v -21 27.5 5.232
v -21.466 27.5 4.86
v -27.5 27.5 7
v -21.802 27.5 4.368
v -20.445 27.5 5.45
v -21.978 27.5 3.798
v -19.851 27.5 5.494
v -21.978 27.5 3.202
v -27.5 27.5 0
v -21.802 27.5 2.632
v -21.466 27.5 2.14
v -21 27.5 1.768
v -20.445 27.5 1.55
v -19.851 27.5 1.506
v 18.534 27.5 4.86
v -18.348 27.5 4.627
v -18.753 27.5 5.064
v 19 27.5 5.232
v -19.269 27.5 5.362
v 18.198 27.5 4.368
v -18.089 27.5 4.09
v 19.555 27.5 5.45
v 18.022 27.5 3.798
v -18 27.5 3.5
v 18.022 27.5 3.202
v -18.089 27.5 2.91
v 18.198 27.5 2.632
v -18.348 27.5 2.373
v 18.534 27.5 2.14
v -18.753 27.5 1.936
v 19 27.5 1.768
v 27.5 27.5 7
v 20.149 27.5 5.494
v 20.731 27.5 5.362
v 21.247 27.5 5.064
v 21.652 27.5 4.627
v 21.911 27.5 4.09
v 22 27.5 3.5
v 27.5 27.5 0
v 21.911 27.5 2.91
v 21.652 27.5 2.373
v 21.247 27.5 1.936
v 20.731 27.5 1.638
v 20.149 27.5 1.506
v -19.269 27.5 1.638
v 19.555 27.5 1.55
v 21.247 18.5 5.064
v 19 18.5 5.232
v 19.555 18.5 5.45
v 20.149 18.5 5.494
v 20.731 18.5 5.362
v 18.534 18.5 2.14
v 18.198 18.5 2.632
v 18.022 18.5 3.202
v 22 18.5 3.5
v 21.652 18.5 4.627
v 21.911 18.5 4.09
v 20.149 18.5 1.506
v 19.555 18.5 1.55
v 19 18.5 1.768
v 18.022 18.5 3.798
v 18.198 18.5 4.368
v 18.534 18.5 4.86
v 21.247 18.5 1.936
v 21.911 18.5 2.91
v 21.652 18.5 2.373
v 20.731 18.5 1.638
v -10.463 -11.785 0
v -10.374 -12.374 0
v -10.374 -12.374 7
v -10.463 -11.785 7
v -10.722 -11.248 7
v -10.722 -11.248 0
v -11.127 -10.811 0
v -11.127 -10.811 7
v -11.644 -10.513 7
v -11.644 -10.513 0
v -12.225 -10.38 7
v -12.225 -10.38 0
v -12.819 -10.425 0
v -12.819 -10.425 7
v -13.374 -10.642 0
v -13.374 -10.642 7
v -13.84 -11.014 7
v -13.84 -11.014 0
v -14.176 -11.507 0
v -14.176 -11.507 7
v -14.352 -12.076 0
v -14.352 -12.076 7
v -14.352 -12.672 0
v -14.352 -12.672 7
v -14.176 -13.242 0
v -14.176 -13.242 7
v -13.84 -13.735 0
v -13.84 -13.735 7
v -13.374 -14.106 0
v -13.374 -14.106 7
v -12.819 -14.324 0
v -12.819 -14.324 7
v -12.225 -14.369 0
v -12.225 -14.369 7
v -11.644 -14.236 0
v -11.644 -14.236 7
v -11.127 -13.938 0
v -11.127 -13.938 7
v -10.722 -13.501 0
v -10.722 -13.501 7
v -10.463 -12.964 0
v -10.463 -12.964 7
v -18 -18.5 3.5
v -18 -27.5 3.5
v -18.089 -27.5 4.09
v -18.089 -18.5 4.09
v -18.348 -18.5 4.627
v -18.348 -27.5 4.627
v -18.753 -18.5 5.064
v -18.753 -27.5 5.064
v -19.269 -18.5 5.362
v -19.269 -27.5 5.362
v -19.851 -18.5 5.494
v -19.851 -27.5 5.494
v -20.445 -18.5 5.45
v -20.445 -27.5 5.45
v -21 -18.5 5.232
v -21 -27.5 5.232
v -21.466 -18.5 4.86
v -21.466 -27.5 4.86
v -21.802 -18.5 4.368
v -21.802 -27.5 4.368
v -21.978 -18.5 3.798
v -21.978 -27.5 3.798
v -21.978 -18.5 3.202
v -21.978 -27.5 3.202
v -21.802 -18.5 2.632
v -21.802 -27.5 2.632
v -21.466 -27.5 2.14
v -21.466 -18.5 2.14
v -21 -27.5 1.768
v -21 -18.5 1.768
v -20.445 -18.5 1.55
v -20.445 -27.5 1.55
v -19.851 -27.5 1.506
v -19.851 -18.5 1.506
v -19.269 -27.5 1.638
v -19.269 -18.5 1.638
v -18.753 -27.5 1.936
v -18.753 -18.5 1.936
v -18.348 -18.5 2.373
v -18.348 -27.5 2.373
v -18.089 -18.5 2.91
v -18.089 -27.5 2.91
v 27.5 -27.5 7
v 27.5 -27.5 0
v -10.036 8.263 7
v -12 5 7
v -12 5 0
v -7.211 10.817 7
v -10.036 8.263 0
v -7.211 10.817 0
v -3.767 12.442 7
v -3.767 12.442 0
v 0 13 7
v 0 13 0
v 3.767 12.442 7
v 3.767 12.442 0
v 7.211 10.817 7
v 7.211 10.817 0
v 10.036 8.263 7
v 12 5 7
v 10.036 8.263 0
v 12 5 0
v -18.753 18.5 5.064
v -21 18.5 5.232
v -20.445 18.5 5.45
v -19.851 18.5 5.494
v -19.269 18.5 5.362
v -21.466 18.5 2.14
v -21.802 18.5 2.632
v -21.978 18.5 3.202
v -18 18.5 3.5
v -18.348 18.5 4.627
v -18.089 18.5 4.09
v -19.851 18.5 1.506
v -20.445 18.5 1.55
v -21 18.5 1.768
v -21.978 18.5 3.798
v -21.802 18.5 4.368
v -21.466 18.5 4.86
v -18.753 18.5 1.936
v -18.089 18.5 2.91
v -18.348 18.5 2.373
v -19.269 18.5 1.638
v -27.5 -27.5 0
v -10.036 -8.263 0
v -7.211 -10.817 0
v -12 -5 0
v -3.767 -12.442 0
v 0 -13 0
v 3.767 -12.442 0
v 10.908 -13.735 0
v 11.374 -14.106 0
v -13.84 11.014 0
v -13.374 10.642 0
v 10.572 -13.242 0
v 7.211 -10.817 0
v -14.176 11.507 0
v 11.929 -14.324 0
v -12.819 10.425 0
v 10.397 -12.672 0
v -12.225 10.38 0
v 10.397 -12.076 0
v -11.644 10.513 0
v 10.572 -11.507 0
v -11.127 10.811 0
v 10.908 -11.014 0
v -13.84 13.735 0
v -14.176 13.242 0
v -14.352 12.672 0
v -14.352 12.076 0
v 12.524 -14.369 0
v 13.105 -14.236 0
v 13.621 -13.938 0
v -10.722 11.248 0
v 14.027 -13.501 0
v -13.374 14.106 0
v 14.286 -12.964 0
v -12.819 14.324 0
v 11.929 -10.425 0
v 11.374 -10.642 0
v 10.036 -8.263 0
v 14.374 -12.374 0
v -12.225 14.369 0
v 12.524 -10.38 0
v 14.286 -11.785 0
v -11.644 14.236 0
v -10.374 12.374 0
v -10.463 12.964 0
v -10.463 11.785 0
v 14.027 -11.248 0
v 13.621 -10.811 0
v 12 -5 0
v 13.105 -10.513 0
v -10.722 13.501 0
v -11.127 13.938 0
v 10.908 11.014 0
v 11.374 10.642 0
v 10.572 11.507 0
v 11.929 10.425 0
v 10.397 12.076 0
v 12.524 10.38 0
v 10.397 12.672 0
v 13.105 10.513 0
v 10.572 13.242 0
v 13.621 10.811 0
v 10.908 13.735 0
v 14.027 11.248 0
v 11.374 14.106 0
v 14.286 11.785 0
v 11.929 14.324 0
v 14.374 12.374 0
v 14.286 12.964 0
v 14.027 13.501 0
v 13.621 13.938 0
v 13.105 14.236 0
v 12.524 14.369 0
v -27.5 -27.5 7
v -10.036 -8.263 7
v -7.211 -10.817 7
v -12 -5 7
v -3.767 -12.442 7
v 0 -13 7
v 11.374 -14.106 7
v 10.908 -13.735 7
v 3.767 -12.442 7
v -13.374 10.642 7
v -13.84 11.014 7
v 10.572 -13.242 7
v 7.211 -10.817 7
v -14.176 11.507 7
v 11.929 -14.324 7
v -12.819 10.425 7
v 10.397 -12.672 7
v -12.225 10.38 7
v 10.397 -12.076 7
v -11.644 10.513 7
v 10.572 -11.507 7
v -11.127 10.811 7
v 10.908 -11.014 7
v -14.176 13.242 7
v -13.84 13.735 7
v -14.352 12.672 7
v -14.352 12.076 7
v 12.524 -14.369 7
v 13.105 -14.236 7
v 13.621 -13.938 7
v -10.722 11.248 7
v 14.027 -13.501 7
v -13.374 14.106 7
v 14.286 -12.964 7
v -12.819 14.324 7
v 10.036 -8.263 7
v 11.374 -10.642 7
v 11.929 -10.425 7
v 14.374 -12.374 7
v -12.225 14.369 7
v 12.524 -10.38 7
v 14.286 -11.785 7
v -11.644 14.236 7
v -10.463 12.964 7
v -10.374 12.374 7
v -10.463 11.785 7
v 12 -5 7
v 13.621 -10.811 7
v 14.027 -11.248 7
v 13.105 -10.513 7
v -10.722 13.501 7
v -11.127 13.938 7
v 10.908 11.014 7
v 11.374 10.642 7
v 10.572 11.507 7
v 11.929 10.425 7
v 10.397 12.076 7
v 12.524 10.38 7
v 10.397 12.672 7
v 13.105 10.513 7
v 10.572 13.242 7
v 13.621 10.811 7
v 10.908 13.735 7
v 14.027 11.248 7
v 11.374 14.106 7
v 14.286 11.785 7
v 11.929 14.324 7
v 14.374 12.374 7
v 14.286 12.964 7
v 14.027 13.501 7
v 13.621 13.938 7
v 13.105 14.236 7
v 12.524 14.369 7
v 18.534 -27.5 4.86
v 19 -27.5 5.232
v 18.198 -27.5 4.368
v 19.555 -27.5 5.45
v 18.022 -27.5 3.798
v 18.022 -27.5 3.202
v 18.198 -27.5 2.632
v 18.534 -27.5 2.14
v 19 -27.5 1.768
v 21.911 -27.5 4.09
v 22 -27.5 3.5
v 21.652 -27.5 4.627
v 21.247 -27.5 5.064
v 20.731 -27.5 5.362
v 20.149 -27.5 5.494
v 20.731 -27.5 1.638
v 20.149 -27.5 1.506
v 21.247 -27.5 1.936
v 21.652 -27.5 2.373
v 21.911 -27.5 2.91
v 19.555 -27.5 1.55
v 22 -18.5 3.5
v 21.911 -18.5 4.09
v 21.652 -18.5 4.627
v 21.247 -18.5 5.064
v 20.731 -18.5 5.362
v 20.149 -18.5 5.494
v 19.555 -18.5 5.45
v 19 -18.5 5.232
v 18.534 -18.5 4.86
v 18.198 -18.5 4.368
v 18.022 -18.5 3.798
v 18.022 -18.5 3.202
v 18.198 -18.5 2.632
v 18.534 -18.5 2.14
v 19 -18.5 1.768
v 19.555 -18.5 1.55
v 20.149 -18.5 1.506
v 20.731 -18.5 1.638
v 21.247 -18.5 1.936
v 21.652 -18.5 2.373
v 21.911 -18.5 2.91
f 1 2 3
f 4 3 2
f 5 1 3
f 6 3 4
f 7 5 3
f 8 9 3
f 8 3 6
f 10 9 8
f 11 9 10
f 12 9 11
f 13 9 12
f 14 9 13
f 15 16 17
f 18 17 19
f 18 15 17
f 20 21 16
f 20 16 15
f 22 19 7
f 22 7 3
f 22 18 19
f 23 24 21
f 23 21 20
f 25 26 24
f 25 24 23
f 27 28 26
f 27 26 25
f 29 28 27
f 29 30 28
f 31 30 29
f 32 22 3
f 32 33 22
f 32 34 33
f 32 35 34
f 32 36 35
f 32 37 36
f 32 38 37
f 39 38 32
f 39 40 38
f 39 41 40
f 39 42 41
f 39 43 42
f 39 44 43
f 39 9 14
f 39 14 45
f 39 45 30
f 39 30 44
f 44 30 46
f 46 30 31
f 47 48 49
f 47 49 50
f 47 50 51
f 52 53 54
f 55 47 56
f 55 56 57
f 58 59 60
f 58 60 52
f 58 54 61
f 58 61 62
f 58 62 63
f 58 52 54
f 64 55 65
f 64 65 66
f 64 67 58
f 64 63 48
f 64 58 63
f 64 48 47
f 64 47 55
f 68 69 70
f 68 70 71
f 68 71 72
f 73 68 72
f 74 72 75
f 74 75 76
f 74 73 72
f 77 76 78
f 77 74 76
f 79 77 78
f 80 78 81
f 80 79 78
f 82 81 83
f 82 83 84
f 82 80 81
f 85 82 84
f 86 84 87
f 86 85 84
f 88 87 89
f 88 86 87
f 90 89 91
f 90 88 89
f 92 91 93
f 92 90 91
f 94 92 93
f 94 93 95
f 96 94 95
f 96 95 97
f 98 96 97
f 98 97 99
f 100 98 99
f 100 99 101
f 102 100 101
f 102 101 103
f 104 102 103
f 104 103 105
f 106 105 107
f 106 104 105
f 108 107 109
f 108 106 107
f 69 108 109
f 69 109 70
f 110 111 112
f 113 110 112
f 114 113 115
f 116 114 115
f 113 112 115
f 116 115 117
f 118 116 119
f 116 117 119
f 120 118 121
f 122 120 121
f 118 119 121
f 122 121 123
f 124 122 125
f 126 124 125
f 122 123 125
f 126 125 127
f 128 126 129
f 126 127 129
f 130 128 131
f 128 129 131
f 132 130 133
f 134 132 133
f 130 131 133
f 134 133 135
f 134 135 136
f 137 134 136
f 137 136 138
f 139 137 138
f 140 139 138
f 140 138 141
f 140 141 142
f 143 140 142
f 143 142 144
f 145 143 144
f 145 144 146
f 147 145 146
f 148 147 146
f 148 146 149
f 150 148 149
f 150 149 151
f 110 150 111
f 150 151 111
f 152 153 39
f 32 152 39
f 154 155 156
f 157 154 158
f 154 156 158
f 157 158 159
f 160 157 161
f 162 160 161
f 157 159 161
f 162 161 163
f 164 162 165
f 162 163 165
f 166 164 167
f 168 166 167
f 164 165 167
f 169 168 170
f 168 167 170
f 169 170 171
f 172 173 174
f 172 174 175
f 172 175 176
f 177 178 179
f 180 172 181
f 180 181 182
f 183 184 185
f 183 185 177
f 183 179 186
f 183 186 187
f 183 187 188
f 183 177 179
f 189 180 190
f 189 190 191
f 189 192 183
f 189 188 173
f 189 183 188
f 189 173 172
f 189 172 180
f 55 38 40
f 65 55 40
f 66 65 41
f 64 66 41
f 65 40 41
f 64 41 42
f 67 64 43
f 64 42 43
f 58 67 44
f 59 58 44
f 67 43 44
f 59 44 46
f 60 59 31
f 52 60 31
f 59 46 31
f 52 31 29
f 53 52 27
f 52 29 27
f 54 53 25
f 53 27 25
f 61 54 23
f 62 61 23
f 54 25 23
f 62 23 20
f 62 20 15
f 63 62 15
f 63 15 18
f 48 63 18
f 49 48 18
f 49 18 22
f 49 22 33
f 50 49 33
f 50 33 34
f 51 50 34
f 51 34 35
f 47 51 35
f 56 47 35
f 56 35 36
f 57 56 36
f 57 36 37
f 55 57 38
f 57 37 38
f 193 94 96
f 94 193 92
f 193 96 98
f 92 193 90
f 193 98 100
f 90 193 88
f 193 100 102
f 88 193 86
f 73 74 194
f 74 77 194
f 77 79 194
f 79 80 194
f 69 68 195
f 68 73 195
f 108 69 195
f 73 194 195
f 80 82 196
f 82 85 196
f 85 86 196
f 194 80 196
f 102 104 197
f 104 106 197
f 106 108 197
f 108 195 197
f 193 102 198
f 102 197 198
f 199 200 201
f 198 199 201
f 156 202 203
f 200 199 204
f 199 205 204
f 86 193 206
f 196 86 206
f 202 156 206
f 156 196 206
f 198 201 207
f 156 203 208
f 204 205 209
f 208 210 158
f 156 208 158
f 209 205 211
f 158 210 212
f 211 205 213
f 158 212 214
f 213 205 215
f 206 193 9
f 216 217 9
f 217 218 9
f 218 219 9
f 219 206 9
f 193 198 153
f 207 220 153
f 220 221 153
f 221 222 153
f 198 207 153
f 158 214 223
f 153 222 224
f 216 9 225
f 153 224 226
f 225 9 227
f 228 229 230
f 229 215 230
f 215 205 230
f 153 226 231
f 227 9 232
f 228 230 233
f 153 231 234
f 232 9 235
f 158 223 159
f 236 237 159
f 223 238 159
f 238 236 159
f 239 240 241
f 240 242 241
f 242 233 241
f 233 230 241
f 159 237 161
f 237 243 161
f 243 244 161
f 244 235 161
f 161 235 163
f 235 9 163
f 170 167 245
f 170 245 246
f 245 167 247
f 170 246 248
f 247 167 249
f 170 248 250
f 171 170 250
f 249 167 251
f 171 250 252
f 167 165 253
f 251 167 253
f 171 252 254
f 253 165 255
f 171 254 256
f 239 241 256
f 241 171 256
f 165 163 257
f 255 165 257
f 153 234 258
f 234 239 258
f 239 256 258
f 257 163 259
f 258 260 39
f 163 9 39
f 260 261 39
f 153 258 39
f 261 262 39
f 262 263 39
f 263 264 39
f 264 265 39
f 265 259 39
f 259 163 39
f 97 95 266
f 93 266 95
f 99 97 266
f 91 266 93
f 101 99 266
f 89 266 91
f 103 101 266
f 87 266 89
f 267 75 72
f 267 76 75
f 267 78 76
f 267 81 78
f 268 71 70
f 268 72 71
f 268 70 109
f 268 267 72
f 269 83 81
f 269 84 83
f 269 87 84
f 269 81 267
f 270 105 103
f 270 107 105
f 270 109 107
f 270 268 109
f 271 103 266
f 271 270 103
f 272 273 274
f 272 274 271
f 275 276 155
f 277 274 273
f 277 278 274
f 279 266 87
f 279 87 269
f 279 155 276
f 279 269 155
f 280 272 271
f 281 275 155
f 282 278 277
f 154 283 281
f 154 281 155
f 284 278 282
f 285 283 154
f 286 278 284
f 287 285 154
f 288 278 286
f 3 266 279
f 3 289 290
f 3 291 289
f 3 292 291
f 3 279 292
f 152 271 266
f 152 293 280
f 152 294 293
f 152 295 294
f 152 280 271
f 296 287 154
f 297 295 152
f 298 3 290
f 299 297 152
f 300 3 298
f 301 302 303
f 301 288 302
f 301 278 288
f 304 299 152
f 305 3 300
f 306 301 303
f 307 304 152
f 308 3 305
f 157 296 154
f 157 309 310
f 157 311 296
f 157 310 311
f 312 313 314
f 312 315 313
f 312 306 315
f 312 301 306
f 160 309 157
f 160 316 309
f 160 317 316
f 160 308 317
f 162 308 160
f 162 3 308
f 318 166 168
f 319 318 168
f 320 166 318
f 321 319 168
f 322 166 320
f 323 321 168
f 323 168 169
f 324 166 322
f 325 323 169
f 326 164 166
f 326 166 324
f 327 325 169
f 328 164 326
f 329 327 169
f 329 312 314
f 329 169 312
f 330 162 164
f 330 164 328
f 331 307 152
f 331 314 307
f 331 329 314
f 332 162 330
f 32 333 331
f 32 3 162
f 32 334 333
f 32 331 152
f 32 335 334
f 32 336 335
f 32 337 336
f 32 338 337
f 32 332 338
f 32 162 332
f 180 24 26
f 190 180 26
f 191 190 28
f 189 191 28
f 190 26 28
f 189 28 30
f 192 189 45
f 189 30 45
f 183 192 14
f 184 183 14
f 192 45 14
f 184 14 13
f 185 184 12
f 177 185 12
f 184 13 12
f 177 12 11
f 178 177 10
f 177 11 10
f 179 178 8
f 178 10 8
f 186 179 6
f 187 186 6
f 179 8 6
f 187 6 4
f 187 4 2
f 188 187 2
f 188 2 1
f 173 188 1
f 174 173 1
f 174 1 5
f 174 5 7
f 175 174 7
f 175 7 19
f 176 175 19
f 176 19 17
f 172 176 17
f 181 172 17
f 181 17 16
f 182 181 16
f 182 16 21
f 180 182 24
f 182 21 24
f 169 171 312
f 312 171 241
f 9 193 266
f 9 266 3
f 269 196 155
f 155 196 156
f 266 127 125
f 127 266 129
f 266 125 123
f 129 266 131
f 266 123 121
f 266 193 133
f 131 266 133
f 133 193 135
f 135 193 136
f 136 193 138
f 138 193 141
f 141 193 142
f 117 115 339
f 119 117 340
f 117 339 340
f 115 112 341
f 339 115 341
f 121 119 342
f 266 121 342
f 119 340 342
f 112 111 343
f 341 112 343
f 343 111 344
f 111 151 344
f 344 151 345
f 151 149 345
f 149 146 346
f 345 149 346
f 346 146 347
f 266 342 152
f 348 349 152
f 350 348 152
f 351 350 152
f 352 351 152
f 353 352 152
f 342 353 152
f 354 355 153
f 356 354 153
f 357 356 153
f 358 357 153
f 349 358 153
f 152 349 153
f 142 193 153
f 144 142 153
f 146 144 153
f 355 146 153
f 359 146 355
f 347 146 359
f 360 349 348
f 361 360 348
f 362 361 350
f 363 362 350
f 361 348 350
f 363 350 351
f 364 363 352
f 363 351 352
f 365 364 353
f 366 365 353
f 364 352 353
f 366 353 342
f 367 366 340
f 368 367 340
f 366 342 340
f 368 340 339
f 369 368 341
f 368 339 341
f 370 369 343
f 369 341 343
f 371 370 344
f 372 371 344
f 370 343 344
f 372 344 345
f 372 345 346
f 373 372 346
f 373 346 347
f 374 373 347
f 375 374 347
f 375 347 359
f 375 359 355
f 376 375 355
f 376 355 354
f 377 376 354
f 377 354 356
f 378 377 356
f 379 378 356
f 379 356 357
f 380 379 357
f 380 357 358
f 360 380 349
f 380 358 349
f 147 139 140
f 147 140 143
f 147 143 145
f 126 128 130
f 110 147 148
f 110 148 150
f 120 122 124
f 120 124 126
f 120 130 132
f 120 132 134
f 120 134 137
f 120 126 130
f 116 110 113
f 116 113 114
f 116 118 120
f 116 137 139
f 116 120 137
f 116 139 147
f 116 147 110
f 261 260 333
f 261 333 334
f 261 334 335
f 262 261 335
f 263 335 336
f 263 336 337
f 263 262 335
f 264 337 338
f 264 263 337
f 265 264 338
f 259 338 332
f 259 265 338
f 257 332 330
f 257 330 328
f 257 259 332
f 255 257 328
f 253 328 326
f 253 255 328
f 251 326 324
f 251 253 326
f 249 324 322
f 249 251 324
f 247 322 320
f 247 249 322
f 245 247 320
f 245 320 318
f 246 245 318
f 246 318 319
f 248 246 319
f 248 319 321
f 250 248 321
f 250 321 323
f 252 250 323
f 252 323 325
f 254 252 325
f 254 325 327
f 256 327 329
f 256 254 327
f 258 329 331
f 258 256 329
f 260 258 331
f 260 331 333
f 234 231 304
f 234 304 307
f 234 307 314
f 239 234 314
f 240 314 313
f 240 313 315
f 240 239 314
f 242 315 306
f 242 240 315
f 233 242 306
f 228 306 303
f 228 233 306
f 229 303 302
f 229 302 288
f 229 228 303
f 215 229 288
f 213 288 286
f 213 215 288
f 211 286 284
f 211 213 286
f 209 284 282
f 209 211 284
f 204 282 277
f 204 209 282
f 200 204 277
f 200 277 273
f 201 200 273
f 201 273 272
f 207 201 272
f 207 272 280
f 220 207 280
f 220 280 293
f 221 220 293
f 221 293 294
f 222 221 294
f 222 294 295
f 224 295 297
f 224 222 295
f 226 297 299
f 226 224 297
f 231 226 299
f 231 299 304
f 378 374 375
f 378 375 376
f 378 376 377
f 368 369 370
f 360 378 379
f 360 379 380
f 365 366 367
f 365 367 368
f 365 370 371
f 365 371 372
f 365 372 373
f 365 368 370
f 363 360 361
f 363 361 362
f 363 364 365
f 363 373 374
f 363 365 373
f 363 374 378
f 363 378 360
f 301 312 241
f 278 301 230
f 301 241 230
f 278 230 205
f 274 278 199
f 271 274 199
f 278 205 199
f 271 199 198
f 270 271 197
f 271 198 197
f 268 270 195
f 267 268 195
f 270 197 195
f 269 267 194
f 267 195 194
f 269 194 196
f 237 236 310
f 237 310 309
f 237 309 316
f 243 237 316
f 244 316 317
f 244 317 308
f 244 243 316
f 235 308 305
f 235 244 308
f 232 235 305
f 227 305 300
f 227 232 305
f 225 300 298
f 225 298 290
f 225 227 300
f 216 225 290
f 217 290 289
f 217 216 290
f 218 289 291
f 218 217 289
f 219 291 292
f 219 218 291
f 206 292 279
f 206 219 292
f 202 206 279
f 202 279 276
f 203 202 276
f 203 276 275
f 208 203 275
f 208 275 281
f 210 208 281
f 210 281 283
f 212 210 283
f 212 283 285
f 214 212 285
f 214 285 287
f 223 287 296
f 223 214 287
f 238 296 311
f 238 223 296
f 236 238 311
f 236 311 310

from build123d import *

# Parameters (mm, degrees)
SKETCH1_W           = 55
SKETCH1_H           = 55
SKETCH1_R           = 2
BOSS_EXTRUDE1_DEPTH = 7
SKETCH2_R           = 2
CUT_EXTRUDE1_DEPTH  = 9
SKETCH3_R           = 2
CUT_EXTRUDE2_DEPTH  = 9


with BuildPart() as part:
    # Sketch1 → Boss-Extrude1 (new body)
    with BuildSketch(Plane.XY):
        Rectangle(SKETCH1_W, SKETCH1_H)
        with Locations((-12.374368671, 12.374368671)):
            Circle(SKETCH1_R, mode=Mode.SUBTRACT)
        with Locations((12.374368671, 12.374368671)):
            Circle(SKETCH1_R, mode=Mode.SUBTRACT)
        with Locations((12.374368671, -12.374368671)):
            Circle(SKETCH1_R, mode=Mode.SUBTRACT)
        with Locations((-12.374368671, -12.374368671)):
            Circle(SKETCH1_R, mode=Mode.SUBTRACT)
        with BuildLine():
            Line((12, 5), (12, -5))
            ThreePointArc((12, -5), (0, -13), (-12, -5))
            Line((-12, -5), (-12, 5))
            ThreePointArc((-12, 5), (0, 13), (12, 5))
        make_face(mode=Mode.SUBTRACT)
    extrude(amount=BOSS_EXTRUDE1_DEPTH)

    # Sketch2 → Cut-Extrude1 (cut)
    with BuildSketch(Plane(origin=(0, 27.5, 0), x_dir=(1, 0, 0), z_dir=(0, 1, 0))):
        with Locations((-20, -3.5)):
            Circle(SKETCH2_R)
        with Locations((20, -3.5)):
            Circle(SKETCH2_R)
    extrude(amount=-CUT_EXTRUDE1_DEPTH, mode=Mode.SUBTRACT)

    # Sketch3 → Cut-Extrude2 (cut)
    with BuildSketch(Plane.XZ.offset(27.5)):
        with Locations((-20, 3.5)):
            Circle(SKETCH3_R)
        with Locations((20, 3.5)):
            Circle(SKETCH3_R)
    extrude(amount=-CUT_EXTRUDE2_DEPTH, mode=Mode.SUBTRACT)


solid = part.part
